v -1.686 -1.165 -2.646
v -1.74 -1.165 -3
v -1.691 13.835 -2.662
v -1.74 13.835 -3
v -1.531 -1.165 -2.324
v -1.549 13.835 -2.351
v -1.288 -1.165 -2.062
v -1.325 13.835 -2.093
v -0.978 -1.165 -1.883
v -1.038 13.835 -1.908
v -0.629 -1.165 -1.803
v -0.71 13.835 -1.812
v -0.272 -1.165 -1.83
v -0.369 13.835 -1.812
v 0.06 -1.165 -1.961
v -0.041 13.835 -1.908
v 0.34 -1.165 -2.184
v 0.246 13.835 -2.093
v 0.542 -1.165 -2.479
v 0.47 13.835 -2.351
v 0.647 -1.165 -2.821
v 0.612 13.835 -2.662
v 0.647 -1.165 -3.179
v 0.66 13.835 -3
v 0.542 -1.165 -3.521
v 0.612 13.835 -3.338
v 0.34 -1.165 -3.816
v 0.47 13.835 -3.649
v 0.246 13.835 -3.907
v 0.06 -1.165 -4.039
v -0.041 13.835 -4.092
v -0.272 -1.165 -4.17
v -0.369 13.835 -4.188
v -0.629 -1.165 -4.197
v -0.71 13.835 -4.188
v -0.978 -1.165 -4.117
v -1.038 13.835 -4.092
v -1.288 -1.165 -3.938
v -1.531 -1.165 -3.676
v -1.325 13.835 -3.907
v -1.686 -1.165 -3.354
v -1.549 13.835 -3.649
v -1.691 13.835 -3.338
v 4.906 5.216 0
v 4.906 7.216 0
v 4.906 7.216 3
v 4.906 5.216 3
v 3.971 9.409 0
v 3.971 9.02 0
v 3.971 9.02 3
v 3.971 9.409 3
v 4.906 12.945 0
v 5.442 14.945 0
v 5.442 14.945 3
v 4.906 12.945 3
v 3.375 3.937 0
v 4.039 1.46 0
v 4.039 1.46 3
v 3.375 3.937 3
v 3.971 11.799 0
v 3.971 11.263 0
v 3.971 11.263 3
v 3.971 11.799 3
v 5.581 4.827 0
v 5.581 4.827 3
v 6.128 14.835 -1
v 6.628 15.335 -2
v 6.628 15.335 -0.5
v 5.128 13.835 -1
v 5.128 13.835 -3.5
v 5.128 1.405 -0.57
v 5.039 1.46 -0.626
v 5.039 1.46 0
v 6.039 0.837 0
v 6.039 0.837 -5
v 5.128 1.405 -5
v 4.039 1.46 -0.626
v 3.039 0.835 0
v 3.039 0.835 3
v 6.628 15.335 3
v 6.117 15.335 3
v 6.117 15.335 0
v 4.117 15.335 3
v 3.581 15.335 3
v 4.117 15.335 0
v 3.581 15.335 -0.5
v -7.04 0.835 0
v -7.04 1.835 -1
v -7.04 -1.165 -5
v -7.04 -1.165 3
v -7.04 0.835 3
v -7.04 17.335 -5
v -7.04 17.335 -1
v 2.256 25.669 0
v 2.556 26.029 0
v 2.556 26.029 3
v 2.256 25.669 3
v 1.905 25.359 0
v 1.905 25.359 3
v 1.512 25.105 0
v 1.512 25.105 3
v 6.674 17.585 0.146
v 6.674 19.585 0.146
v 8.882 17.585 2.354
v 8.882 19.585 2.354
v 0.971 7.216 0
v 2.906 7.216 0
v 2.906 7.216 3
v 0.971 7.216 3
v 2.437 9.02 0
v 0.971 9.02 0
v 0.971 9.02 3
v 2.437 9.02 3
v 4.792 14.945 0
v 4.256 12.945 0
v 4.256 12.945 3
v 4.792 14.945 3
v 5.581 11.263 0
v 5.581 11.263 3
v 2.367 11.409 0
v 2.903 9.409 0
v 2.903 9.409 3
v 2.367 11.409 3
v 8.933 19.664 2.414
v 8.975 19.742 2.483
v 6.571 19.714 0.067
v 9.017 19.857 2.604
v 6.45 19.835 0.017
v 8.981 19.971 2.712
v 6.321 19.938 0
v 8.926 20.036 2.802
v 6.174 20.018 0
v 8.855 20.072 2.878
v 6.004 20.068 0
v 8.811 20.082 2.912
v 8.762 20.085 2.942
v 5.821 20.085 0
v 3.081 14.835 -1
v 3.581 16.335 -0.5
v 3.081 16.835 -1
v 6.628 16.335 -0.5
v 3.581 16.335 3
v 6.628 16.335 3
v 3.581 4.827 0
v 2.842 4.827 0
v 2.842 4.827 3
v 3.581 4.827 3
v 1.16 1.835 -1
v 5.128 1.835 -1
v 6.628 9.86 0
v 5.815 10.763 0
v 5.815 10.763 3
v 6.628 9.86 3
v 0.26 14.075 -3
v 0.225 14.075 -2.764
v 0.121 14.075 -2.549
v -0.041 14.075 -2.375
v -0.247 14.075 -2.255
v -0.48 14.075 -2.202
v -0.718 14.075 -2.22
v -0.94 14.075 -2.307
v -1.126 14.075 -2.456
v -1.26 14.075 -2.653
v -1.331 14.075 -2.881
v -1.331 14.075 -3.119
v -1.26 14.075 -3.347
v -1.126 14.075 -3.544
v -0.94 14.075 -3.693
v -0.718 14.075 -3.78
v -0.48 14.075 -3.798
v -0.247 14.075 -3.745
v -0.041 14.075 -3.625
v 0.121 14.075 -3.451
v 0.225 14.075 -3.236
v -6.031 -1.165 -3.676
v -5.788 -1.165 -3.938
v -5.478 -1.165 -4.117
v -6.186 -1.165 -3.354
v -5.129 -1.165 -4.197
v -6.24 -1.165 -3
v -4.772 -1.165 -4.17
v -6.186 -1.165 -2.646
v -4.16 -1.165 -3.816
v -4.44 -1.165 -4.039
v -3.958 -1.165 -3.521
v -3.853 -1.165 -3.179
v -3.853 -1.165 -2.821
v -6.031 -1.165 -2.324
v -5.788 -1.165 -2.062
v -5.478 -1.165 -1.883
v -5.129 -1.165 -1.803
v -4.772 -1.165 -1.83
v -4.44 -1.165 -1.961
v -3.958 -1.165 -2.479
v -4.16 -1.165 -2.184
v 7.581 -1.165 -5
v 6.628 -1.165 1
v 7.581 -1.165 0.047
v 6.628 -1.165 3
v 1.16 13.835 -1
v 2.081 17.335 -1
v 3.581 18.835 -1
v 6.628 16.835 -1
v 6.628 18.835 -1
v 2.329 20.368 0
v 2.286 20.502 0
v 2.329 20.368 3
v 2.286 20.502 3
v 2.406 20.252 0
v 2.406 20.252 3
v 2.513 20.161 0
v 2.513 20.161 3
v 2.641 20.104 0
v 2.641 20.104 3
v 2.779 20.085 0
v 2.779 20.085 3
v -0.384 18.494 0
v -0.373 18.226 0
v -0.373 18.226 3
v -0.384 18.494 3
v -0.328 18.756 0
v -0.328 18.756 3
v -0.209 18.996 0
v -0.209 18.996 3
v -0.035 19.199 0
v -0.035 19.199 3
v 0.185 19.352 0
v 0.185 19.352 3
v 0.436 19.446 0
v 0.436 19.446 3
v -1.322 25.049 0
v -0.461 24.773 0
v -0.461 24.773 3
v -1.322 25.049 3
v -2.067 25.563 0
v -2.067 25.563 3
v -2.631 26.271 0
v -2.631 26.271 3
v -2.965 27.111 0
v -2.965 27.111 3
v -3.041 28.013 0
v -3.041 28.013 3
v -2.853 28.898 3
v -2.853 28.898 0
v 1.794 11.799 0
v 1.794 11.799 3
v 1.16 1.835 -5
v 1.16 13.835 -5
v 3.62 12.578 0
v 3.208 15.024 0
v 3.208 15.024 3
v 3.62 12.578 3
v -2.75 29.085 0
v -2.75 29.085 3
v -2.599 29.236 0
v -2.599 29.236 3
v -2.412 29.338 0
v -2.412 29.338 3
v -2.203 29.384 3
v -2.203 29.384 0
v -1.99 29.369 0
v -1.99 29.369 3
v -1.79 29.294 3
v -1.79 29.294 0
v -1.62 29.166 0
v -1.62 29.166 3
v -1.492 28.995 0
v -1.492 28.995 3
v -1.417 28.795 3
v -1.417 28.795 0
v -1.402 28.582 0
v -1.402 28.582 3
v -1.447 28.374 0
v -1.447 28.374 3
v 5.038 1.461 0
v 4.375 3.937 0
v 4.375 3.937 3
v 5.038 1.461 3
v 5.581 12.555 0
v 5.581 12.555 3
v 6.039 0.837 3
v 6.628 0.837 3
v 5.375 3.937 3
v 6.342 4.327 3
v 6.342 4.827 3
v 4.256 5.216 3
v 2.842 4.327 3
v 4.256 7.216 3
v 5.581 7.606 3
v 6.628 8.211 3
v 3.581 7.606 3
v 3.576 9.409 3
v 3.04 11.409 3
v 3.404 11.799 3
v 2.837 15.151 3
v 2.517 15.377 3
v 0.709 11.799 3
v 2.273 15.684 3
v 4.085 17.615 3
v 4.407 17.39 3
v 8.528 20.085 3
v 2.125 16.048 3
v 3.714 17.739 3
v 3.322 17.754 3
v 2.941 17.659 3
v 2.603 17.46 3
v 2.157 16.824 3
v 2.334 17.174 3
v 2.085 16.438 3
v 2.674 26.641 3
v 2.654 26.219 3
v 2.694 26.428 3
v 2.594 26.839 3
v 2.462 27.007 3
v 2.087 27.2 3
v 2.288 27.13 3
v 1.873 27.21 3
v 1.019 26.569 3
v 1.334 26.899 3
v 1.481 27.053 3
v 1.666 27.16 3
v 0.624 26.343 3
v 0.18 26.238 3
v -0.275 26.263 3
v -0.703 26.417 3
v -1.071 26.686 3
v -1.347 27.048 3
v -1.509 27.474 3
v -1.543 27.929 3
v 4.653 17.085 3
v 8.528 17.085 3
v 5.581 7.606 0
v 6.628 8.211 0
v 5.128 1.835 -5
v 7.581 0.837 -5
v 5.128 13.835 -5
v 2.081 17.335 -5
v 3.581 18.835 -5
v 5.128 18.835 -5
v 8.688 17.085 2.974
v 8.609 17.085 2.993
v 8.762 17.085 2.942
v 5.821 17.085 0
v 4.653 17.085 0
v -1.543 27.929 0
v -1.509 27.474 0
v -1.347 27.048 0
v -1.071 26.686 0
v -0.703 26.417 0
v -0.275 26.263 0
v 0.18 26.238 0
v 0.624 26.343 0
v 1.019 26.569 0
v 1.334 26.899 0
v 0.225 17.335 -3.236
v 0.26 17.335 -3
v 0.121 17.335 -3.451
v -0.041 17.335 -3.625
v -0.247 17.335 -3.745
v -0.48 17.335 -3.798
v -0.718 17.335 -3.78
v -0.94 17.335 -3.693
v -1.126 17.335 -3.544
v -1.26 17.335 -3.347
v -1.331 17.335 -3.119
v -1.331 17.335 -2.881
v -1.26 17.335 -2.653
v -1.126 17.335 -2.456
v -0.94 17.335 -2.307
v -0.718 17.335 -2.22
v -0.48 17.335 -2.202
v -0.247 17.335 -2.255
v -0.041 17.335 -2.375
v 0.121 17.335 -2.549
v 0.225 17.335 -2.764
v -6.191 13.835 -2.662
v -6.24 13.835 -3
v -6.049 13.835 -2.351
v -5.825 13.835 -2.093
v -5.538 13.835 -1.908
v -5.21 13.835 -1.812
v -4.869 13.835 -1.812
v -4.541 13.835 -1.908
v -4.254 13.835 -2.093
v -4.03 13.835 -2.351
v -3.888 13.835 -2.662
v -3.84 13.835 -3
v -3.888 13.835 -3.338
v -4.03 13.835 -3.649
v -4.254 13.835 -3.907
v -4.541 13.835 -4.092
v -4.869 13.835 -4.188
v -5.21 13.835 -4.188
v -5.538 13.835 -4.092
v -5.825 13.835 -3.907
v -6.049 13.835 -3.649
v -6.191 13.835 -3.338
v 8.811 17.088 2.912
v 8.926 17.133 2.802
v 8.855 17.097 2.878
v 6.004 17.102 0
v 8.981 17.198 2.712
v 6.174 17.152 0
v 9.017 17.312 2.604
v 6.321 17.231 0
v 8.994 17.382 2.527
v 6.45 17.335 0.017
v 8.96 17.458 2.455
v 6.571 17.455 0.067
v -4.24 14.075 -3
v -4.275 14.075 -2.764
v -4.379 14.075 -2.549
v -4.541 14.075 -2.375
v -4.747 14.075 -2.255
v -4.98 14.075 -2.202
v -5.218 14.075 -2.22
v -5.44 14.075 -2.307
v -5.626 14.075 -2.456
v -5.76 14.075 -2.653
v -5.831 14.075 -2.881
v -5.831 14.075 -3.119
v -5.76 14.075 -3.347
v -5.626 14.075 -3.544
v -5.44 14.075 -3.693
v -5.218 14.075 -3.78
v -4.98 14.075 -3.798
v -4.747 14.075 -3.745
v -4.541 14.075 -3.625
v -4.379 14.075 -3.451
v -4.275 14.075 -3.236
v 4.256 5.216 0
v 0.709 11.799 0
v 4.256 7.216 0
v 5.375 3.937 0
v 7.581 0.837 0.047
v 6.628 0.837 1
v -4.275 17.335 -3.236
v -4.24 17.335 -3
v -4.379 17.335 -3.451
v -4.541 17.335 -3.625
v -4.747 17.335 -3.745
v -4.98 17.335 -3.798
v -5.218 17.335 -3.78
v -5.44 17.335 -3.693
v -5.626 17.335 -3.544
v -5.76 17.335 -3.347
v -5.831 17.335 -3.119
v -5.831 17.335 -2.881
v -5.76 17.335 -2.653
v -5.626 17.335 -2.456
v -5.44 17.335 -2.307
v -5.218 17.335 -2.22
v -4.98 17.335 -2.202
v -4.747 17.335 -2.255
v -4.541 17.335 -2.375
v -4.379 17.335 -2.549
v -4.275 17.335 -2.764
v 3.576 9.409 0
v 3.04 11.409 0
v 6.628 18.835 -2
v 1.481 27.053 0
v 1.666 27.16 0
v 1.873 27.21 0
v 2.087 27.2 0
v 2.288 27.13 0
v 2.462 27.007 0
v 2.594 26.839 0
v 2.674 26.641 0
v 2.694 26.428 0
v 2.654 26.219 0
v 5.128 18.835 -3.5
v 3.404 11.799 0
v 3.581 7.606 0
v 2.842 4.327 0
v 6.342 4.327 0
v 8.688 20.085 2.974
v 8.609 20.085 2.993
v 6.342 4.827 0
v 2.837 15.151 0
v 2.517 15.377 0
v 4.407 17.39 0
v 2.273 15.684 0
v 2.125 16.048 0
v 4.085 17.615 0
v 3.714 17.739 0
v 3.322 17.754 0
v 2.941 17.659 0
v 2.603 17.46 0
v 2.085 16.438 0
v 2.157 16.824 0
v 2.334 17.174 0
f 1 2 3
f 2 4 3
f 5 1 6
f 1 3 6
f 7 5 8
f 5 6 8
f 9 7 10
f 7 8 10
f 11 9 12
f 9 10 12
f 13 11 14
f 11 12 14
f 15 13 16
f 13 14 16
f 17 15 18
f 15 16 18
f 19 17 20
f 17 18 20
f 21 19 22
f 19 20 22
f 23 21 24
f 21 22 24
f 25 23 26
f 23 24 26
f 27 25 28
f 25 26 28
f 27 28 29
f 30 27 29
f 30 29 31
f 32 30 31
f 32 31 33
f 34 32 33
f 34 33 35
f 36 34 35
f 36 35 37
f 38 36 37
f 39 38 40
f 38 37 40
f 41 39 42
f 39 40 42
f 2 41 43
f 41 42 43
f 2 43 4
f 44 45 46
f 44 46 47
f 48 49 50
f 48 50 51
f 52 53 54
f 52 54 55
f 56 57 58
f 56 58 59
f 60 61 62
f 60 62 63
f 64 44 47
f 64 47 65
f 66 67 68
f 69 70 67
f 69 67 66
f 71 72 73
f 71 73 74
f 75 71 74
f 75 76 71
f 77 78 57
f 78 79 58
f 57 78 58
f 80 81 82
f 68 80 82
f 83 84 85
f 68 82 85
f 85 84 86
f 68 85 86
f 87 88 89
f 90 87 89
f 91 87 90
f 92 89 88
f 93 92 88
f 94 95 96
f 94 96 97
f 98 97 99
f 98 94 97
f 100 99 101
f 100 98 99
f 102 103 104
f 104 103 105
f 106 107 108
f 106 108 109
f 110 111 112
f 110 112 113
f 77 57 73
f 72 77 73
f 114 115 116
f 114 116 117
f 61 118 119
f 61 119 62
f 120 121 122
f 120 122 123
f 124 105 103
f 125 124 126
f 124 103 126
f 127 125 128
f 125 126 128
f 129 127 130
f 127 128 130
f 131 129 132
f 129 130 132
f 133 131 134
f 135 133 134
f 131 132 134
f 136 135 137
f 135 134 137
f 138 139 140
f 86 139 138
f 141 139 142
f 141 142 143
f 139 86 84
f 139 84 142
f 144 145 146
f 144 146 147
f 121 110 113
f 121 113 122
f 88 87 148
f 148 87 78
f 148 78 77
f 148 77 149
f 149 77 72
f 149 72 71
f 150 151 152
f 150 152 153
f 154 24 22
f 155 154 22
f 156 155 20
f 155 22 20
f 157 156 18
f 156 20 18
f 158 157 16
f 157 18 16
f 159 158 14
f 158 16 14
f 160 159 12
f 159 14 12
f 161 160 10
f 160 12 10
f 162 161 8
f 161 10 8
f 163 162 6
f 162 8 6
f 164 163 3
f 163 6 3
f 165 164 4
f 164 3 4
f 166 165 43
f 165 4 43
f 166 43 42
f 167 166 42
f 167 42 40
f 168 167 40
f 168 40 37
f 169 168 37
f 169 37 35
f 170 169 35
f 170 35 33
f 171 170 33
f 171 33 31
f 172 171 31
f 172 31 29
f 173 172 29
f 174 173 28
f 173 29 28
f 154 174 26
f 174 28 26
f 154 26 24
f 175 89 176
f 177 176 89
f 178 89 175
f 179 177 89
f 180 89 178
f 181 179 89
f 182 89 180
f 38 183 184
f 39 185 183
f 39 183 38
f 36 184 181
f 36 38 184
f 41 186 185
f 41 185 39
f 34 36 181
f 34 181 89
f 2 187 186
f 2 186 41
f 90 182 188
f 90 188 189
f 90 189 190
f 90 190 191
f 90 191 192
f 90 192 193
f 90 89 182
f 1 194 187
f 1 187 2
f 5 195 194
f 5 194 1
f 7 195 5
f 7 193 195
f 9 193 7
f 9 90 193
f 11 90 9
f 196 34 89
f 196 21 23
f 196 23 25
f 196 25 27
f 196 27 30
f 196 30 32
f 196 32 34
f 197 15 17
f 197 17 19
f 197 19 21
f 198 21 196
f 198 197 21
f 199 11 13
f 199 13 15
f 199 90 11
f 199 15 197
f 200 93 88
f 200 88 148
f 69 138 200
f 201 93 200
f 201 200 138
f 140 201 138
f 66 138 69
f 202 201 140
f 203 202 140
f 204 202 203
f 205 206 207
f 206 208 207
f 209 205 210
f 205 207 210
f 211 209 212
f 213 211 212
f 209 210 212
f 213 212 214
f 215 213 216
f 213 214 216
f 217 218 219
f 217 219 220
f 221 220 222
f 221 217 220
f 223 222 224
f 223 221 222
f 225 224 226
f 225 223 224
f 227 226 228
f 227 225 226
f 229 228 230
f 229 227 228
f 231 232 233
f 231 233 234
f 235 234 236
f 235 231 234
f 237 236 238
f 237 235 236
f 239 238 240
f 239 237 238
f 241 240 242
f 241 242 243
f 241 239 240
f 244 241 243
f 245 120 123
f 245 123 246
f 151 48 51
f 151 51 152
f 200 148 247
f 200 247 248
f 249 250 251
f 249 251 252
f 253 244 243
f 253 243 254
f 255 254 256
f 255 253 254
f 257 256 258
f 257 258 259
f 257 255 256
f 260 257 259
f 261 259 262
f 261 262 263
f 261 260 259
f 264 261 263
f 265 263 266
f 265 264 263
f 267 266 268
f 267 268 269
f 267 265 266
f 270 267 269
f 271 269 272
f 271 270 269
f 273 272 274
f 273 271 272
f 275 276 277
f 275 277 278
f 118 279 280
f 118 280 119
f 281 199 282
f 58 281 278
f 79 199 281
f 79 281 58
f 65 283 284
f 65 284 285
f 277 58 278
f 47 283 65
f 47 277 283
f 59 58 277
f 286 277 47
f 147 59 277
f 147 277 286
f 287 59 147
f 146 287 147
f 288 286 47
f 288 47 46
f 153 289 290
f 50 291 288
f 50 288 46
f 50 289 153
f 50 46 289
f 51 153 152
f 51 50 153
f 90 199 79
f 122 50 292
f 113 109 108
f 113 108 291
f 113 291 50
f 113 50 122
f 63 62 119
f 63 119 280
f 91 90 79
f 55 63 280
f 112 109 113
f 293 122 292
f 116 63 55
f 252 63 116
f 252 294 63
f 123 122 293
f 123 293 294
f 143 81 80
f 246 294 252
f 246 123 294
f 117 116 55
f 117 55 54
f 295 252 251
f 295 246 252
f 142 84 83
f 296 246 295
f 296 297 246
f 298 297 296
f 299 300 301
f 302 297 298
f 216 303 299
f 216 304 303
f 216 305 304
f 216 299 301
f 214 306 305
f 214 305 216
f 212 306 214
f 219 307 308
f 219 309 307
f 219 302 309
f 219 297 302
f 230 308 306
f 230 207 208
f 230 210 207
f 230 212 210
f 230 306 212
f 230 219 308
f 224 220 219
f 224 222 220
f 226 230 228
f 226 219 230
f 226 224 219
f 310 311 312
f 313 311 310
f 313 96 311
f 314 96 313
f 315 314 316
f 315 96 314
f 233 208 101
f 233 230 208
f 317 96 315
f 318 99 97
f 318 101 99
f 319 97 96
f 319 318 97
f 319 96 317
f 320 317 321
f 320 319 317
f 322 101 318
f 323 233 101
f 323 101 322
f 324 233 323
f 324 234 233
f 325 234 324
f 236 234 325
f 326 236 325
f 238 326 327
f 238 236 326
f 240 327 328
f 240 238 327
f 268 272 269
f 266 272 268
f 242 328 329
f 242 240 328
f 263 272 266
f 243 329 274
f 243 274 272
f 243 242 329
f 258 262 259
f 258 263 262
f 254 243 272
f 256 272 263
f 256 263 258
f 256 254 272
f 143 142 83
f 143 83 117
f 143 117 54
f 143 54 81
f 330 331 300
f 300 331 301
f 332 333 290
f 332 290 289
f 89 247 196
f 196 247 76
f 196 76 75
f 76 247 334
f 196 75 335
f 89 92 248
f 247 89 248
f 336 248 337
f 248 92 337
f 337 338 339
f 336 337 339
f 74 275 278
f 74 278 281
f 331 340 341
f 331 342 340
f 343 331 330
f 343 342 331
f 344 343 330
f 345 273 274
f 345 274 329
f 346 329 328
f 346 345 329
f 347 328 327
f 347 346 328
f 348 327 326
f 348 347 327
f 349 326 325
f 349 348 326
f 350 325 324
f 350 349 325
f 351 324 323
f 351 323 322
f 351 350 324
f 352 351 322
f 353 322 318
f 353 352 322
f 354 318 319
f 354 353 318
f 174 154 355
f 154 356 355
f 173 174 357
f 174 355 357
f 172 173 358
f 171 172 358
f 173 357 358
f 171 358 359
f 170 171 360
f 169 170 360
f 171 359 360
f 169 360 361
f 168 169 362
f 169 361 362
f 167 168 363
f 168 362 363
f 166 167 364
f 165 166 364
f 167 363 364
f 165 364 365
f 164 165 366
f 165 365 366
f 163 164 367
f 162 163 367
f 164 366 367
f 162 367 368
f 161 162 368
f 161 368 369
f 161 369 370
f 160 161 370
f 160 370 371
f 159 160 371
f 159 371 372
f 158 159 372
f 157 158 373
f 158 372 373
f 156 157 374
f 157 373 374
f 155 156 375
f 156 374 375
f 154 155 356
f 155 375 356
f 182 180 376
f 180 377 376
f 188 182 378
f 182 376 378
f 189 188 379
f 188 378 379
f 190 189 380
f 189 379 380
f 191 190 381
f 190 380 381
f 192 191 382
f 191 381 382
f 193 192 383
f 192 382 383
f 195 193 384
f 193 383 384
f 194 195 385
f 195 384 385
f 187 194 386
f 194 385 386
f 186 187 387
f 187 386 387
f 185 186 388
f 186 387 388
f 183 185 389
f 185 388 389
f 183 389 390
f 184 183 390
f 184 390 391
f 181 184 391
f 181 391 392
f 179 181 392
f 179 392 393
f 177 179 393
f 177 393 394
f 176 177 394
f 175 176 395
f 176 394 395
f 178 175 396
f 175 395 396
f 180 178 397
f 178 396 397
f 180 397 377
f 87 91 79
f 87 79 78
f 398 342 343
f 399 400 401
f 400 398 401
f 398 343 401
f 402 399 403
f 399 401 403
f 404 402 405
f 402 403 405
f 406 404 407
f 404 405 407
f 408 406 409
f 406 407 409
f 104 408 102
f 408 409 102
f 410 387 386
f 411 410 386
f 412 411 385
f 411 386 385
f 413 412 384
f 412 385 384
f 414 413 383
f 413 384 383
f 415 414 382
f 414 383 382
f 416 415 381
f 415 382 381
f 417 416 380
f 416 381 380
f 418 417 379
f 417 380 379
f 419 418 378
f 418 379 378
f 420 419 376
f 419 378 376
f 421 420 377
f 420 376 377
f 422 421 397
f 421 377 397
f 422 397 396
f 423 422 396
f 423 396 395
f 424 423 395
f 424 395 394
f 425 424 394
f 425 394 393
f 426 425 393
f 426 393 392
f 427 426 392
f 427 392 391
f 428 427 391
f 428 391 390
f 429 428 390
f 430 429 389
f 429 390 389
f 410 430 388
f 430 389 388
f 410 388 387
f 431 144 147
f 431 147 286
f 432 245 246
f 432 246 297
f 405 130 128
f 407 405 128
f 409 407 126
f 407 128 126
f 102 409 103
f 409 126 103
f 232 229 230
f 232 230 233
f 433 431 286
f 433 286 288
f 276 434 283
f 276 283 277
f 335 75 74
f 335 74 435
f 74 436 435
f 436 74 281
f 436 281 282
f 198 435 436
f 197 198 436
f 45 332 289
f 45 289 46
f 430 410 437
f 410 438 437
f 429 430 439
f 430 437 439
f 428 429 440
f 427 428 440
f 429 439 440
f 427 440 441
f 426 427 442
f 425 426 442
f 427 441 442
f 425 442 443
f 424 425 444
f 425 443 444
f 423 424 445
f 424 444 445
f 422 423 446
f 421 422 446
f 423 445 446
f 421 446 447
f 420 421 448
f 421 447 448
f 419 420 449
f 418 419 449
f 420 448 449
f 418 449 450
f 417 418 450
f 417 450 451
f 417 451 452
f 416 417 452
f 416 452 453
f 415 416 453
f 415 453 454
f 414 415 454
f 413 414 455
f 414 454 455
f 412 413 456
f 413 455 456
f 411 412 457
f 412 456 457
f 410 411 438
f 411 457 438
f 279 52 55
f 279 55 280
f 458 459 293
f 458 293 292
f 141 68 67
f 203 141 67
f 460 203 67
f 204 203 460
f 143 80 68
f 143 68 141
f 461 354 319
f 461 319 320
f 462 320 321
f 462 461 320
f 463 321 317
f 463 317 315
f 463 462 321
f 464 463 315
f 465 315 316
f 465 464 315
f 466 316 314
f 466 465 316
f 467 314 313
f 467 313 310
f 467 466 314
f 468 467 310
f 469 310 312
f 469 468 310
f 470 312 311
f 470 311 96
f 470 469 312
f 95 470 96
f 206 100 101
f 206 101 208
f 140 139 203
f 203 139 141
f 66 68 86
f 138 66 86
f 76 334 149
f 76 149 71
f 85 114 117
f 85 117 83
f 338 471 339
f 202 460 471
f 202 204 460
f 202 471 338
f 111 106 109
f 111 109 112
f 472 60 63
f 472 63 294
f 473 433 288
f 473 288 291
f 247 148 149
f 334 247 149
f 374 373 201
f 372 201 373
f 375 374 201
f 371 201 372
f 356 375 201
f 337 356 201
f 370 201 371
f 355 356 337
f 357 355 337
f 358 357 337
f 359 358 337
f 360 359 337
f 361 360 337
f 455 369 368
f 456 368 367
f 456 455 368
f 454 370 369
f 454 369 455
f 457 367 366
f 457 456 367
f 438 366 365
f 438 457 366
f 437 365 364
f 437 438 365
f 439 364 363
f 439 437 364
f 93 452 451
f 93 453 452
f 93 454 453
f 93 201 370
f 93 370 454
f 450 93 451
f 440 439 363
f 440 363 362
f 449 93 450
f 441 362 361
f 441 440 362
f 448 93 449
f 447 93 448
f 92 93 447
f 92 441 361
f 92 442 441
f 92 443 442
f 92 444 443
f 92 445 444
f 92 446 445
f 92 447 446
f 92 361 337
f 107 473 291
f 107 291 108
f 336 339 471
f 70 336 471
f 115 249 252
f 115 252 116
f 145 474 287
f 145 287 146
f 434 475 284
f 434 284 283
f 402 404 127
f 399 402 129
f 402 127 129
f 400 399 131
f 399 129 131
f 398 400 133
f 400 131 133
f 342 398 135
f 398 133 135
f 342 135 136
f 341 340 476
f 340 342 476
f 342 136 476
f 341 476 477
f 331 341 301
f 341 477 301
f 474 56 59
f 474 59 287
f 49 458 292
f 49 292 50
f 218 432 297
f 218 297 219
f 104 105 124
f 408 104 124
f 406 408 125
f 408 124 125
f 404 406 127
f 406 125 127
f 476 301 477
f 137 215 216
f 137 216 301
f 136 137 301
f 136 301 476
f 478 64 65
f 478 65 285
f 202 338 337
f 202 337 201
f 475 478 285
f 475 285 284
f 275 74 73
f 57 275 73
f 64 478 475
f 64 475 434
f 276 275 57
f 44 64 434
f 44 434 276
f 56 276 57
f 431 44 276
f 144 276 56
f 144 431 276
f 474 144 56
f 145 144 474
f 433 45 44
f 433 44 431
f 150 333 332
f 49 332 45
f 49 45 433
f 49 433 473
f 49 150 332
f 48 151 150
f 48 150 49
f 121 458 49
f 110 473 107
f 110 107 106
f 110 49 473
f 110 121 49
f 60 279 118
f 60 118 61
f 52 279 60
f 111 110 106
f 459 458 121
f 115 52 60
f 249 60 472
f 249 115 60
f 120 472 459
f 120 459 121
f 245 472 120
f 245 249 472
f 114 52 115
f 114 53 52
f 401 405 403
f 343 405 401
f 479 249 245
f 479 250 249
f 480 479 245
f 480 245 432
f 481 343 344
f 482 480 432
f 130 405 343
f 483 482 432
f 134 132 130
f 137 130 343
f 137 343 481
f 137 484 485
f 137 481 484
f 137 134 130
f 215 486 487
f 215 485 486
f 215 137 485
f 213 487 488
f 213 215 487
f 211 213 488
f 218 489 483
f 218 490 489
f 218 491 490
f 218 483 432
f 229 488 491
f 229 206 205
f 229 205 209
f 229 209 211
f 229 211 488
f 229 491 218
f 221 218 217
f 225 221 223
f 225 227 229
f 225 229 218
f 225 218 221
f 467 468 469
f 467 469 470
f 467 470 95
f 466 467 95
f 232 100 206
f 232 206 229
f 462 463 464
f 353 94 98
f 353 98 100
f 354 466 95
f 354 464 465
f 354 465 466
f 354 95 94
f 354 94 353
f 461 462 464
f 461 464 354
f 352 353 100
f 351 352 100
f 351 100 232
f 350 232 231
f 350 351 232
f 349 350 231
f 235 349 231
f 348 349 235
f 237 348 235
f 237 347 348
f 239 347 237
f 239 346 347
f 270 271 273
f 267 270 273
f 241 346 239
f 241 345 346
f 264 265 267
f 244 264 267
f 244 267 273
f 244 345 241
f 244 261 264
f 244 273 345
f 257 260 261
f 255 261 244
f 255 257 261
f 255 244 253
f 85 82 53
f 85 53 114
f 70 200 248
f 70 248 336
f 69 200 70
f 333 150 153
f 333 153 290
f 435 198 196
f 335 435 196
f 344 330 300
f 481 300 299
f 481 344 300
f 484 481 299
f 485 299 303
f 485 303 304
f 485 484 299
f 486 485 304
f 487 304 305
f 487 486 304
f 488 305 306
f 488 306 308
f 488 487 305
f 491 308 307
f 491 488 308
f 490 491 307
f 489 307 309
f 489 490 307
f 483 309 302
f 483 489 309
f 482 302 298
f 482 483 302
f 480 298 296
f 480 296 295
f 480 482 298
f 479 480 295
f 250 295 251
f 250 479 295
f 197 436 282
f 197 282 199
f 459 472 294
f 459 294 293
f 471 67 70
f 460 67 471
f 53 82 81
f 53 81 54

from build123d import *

# Parameters (mm, degrees)
BOSS_SWITCH_BODY_DEPTH                    = 3
SKETCH1_W                                 = 4
SKETCH1_H                                 = 3.5
BOSS_FLANGE_WIDTH_DEPTH                   = 5
BOSS_FLANGE_HEIGHT_REACH                  = 35.863
SKETCH2_W                                 = 4
SKETCH2_H                                 = 2
SKETCH2_W_2                               = 8
SKETCH24_W                                = 4
SKETCH24_H                                = 2.5
CUT_WALL_CLEARANCE_DEPTH                  = 1
CUT_UP_TO_DOWN_DERAILLEUR_CLEARANCE_REACH = 21.462
SKETCH10_W                                = 2.453096586
SKETCH10_H                                = 3
SKETCH17_W                                = 12.1675
SKETCH17_H                                = 4
BOSS_FLANGE_SUPPORT_DEPTH                 = 14.5
TAP_DRILL_FOR_M2X0_4_TAP1_D               = 1.6
M2_CLEARANCE_HOLE2_D                      = 2.4
M2_CLEARANCE_HOLE2_DEPTH                  = 15
M2_CLEARANCE_HOLE2_TIP                    = 0.721032743
CUT_UP_TO_DOWN_CANTILEVER_SLOPE_REACH     = 25.623
CHAMFER_FLANGE_SUPPORT_SIZE               = 1.5
CHAMFER_FLANGE_SUPPORT_2_SIZE             = 1.5
CHAMFER_FLANGE_SUPPORT_3_SIZE             = 1
CHAMFER3_SIZE                             = 0.5
SKETCH23_W                                = 3.9675
SKETCH23_H                                = 12
CUT_GAP_FOR_PRINTING_DEPTH                = 32.000499688
SKETCH25_W                                = 0.953096586
SKETCH25_H                                = 3.5
CUT_DERAILLEUR_CLEARANCE_DEPTH            = 32.145320369
CHAMFER8_SIZE                             = 1
FILLET1_R                                 = 0.5
FILLET2_R                                 = 0.5


# Some blends are built 0.0001 mm under size
with BuildPart() as part:
    # Sketch-SwitchBossUp → Boss-Switch Body (new body)
    with BuildSketch(Plane.XY):
        with BuildLine():
            Line((5.581091201, 12.555245643), (5.581100766, 11.263014573))
            Line((5.581100766, 11.263014573), (3.971265023, 11.263014573))
            Line((3.971265023, 11.263014573), (3.97126394, 11.799102818))
            Line((3.97126394, 11.799102818), (3.403924927, 11.799102818))
            Line((3.403924927, 11.799102818), (3.039779642, 11.409400656))
            Line((3.039779642, 11.409400656), (3.575693893, 9.409400656))
            Line((3.575693893, 9.409400656), (3.971278743, 9.019679955))
            Line((3.971278743, 9.019679955), (3.971278743, 9.409400656))
            Line((3.971278743, 9.409400656), (5.815190872, 10.763014573))
            Line((5.815190872, 10.763014573), (6.627976927, 9.860324208))
            Line((6.627976927, 9.860324208), (6.627976927, 8.210536506))
            Line((6.627976927, 8.210536506), (5.581127833, 7.606137899))
            Line((5.581127833, 7.606137899), (4.906138119, 7.216432406))
            Line((4.906138119, 7.216432406), (4.906138119, 5.216432406))
            Line((4.906138119, 5.216432406), (5.58114552, 4.826716701))
            Line((5.58114552, 4.826716701), (6.342350466, 4.826716701))
            Line((6.342350466, 4.826716701), (6.342350466, 4.326716701))
            Line((6.342350466, 4.326716701), (5.374946804, 3.937018274))
            Line((5.374946804, 3.937018274), (4.374946804, 3.937018274))
            Line((4.374946804, 3.937018274), (5.038286759, 1.461399857))
            Line((5.038286759, 1.461399857), (6.03883266, 0.837018274))
            Line((6.03883266, 0.837018274), (6.627976927, 0.837018274))
            Line((6.627976927, 0.837018274), (6.627976927, -1.165310653))
            Line((6.627976927, -1.165310653), (5.038286759, -1.165310653))
            Line((5.038286759, -1.165310653), (3.03883266, -1.165310653))
            Line((3.03883266, -1.165310653), (3.03883266, 0.834689347))
            Line((3.03883266, 0.834689347), (4.03855971, 1.460381193))
            Line((4.03855971, 1.460381193), (3.374946804, 3.937018274))
            Line((3.374946804, 3.937018274), (2.842350466, 4.326720436))
            Line((2.842350466, 4.326720436), (2.842350466, 4.826720436))
            Line((2.842350466, 4.826720436), (3.58114552, 4.826720436))
            Line((3.58114552, 4.826720436), (4.256138119, 5.216427595))
            Line((4.256138119, 5.216427595), (4.256138119, 7.216427595))
            Line((4.256138119, 7.216427595), (3.581130717, 7.6061433))
            Line((3.581130717, 7.6061433), (2.9061262, 7.216422599))
            Line((2.9061262, 7.216422599), (0.971281627, 7.216422599))
            Line((0.971281627, 7.216422599), (0.971281627, 9.019700159))
            Line((0.971281627, 9.019700159), (1.971281627, 9.019700159))
            Line((1.971281627, 9.019700159), (2.437470124, 9.019700159))
            Line((2.437470124, 9.019700159), (2.902763041, 9.409400656))
            Line((2.902763041, 9.409400656), (2.36684879, 11.409400656))
            Line((2.36684879, 11.409400656), (1.794010401, 11.799102818))
            Line((1.794010401, 11.799102818), (0.709180957, 11.799102818))
            Line((0.709180957, 11.799102818), (-0.372790983, 18.226392362))
            ThreePointArc((-0.372790983, 18.226392362), (-0.209317989, 18.996086179), (0.435897335, 19.446473985))
            Line((0.435897335, 19.446473985), (-0.46073685, 24.772792819))
            ThreePointArc((-0.46073685, 24.772792819), (-2.630501593, 26.270619745), (-2.852546321, 28.897797067))
            ThreePointArc((-2.852546321, 28.897797067), (-1.887813913, 29.338582026), (-1.447028953, 28.373849618))
            ThreePointArc((-1.447028953, 28.373849618), (-0.703448682, 26.416936722), (1.333779254, 26.898727173))
            ThreePointArc((1.333779254, 26.898727173), (2.379722745, 27.074801628), (2.555797201, 26.028858137))
            ThreePointArc((2.555797201, 26.028858137), (2.086504637, 25.507104397), (1.511513111, 25.104801997))
            Line((1.511513111, 25.104801997), (2.35660045, 20.084689347))
            Line((2.35660045, 20.084689347), (7.435924807, 20.084689347))
            Line((7.435924807, 20.084689347), (9.027976927, 20.084689347))
            Line((9.027976927, 20.084689347), (9.027976927, 17.084689347))
            Line((9.027976927, 17.084689347), (4.653192692, 17.084689347))
            ThreePointArc((4.653192692, 17.084689347), (2.334416318, 17.173683719), (3.208498298, 15.02411991))
            Line((3.208498298, 15.02411991), (3.620297651, 12.577888564))
            Line((3.620297651, 12.577888564), (4.256080915, 12.944958203))
            Line((4.256080915, 12.944958203), (4.791964496, 14.944962169))
            Line((4.791964496, 14.944962169), (4.116925685, 15.334689347))
            Line((4.116925685, 15.334689347), (3.581073513, 15.334689347))
            Line((3.581073513, 15.334689347), (3.581073513, 16.334689347))
            Line((3.581073513, 16.334689347), (5.725580434, 16.334689347))
            Line((5.725580434, 16.334689347), (6.627976927, 16.334689347))
            Line((6.627976927, 16.334689347), (6.627976927, 15.334689347))
            Line((6.627976927, 15.334689347), (6.116971898, 15.334689347))
            Line((6.116971898, 15.334689347), (5.441964496, 14.94496698))
            Line((5.441964496, 14.94496698), (4.906080915, 12.944963014))
            Line((4.906080915, 12.944963014), (5.581091201, 12.555245643))
        make_face()
    extrude(amount=BOSS_SWITCH_BODY_DEPTH)

    # Sketch1 → Boss-Flange Width (add)
    with BuildSketch(Plane(origin=(0, 0, 0), x_dir=(-1, 0, 0), z_dir=(0, 0, -1))):
        Polygon((-7.581073513, -1.165310653), (0.412170615, -1.165310653), (0.412170615, 0.834689347), (-3.03883266, 0.834689347), (-4.03855971, 1.460381193), (-5.03855971, 1.460381193), (-6.03883266, 0.837018274), (-7.581073513, 0.837018274), align=None)
        with Locations((-5.581073513, 17.084689347)):
            Rectangle(SKETCH1_W, SKETCH1_H)
    extrude(amount=BOSS_FLANGE_WIDTH_DEPTH)

    # Sketch2 → Boss-Flange Height (add, up to next)
    with BuildSketch(Plane(origin=(-7.039523073, 0, 0), x_dir=(0, 0, -1), z_dir=(1, 0, 0)), mode=Mode.PRIVATE) as boss_flange_height_sk1:
        with Locations((3, 16.334689347)):
            Rectangle(SKETCH2_W, SKETCH2_H)
    boss_flange_height_tool1 = extrude(boss_flange_height_sk1.sketch, amount=BOSS_FLANGE_HEIGHT_REACH, mode=Mode.PRIVATE) - part.part
    # Sketch2 → Boss-Flange Height (add, up to next)
    with BuildSketch(Plane(origin=(-7.039523073, 0, 0), x_dir=(0, 0, -1), z_dir=(1, 0, 0)), mode=Mode.PRIVATE) as boss_flange_height_sk2:
        with Locations((1, -0.165310653)):
            Rectangle(SKETCH2_W_2, SKETCH2_H)
    boss_flange_height_tool2 = extrude(boss_flange_height_sk2.sketch, amount=BOSS_FLANGE_HEIGHT_REACH, mode=Mode.PRIVATE) - part.part
    add(boss_flange_height_tool1.solids().sort_by_distance((-7.039523, 16.334689, -3))[0])
    add(boss_flange_height_tool2.solids().sort_by_distance((-7.039523, -0.165311, -1))[0])

    # Sketch24 → Cut-Wall Clearance (cut)
    with BuildSketch(Plane.XY):
        with Locations((5.581073513, 17.584689347)):
            Rectangle(SKETCH24_W, SKETCH24_H)
    extrude(amount=-CUT_WALL_CLEARANCE_DEPTH, mode=Mode.SUBTRACT)

    # Sketch10 → Cut-Up-To-Down Derailleur Clearance (cut, up to next)
    with BuildSketch(Plane(origin=(0, 15.334689347, 0), x_dir=(1, 0, 0), z_dir=(0, 1, 0)), mode=Mode.PRIVATE) as cut_up_to_down_derailleur_clearance_sk1:
        with Locations((6.35452522, 3.5)):
            Rectangle(SKETCH10_W, SKETCH10_H)
    cut_up_to_down_derailleur_clearance_tool1 = extrude(cut_up_to_down_derailleur_clearance_sk1.sketch, amount=CUT_UP_TO_DOWN_DERAILLEUR_CLEARANCE_REACH, mode=Mode.PRIVATE) & part.part
    add(cut_up_to_down_derailleur_clearance_tool1.solids().sort_by_distance((6.354525, 15.334689, -3.5))[0], mode=Mode.SUBTRACT)

    # Sketch17 → Boss-Flange Support (add)
    with BuildSketch(Plane.XZ.offset(-15.334689347)):
        with Locations((-0.955773073, -3)):
            Rectangle(SKETCH17_W, SKETCH17_H)
    extrude(amount=BOSS_FLANGE_SUPPORT_DEPTH)

    # Tap Drill for M2x0.4 Tap1 (through all)
    with Locations(Plane(origin=(0, -1.165310653, 0), x_dir=(-1, 0, 0), z_dir=(0, -1, 0))):
        with Locations((5.039523073, 3), (0.539523073, 3)):
            Hole(TAP_DRILL_FOR_M2X0_4_TAP1_D / 2)

    # M2 Clearance Hole2
    with Locations(Plane.XZ.offset(1.165310653)):
        with Locations((-5.039523073, -3), (-0.539523073, -3)):
            Hole(M2_CLEARANCE_HOLE2_D / 2, depth=M2_CLEARANCE_HOLE2_DEPTH)
            with Locations((0, 0, -(M2_CLEARANCE_HOLE2_DEPTH + M2_CLEARANCE_HOLE2_TIP / 2))):  # 118° drill point
                Cone(0, M2_CLEARANCE_HOLE2_D / 2, M2_CLEARANCE_HOLE2_TIP, mode=Mode.SUBTRACT)

    # Sketch12 → Cut-Up-to-Down Cantilever Slope (cut, up to next)
    with BuildSketch(Plane(origin=(0, 20.084689347, 0), x_dir=(1, 0, 0), z_dir=(0, 1, 0)), mode=Mode.PRIVATE) as cut_up_to_down_cantilever_slope_sk1:
        Polygon((6.527976927, 0), (9.027976927, -2.5), (9.027976927, 0), align=None)
    cut_up_to_down_cantilever_slope_tool1 = extrude(cut_up_to_down_cantilever_slope_sk1.sketch, amount=-CUT_UP_TO_DOWN_CANTILEVER_SLOPE_REACH, mode=Mode.PRIVATE) & part.part
    add(cut_up_to_down_cantilever_slope_tool1.solids().sort_by_distance((8.194644, 20.084689, 0.833333))[0], mode=Mode.SUBTRACT)

    # Chamfer-Flange Support
    chamfer_flange_support_edges = [part.edges().sort_by_distance(p)[0] for p in [
        (3.581073513, 17.334689347, -3),
    ]]
    chamfer(chamfer_flange_support_edges, length=CHAMFER_FLANGE_SUPPORT_SIZE - 0.0001)  # a hair under: the kernel refuses the full size

    # Chamfer-Flange Support 2
    chamfer_flange_support_2_edges = [part.edges().sort_by_distance(p)[0] for p in [
        (5.127976927, 17.084689347, -2),
        (5.127976927, 15.334689347, -1.5),
    ]]
    chamfer(chamfer_flange_support_2_edges, length=CHAMFER_FLANGE_SUPPORT_2_SIZE)

    # Chamfer-Flange Support 3
    chamfer_flange_support_3_edges = [part.edges().sort_by_distance(p)[0] for p in [
        (-2.000345206, 0.834689347, -1),
    ]]
    chamfer(chamfer_flange_support_3_edges, length=CHAMFER_FLANGE_SUPPORT_3_SIZE)

    # Chamfer3
    chamfer3_edges = [part.edges().sort_by_distance(p)[0] for p in [
        (3.581073513, 15.834689347, -1),
        (5.581073513, 16.334689347, -1),
        (5.10452522, 15.334689347, -1),
    ]]
    chamfer(chamfer3_edges, length=CHAMFER3_SIZE)

    # Sketch23 → Cut-Gap for Printing (cut, through all)
    with BuildSketch(Plane.XY.offset(-1)):
        with Locations((3.144226927, 7.834689347)):
            Rectangle(SKETCH23_W, SKETCH23_H)
    extrude(amount=-CUT_GAP_FOR_PRINTING_DEPTH, mode=Mode.SUBTRACT)

    # Sketch25 → Cut-Derailleur Clearance (cut, through all)
    with BuildSketch(Plane.XY):
        with Locations((7.10452522, 17.084689347)):
            Rectangle(SKETCH25_W, SKETCH25_H)
    extrude(amount=-CUT_DERAILLEUR_CLEARANCE_DEPTH, mode=Mode.SUBTRACT)

    # Chamfer8
    # the kernel refuses this chamfer: 1 mm, written as the material it adds along each edge
    with BuildSketch(Plane(origin=(6.627976927, 0.837018274, 0), x_dir=(0.9996219169112968, 0, -0.027495876610586365), z_dir=(0, -1, 0))) as chamfer8_piece_1_section:
        Polygon((CHAMFER8_SIZE * 0.999621916911, CHAMFER8_SIZE * 0.0274958766106), (-CHAMFER8_SIZE * 0.0274958766106, CHAMFER8_SIZE * 0.999621916911), (0, 0), align=None)
    chamfer8_piece_1 = extrude(amount=2.002328927, mode=Mode.PRIVATE)
    chamfer8_piece_1 = split(chamfer8_piece_1, bisect_by=Plane(origin=(7.581073513, -0.16414619, 0.332375145), z_dir=(-1, 0, 0)), keep=Keep.TOP, mode=Mode.PRIVATE)
    add(chamfer8_piece_1)

    # Fillet1
    # the kernel refuses this fillet: 0.5 mm, written as the material it takes off along each edge
    with BuildSketch(Plane(origin=(6.527976927, 20.6024563, 0), x_dir=(-1, 0, 0), z_dir=(0, -1, 0))) as fillet1_piece_1:
        with BuildLine():
            CenterArc((FILLET1_R * 0.414213562373, -FILLET1_R), FILLET1_R, 90, 45)
            Line((-FILLET1_R * 0.292893218813, -FILLET1_R * 0.292893218813), (0, 0))
            Line((0, 0), (FILLET1_R * 0.414213562373, 0))
        make_face()
    extrude(amount=4.035533906, mode=Mode.SUBTRACT)
    with BuildSketch(Plane(origin=(9.027976927, 21.334689347, 3), x_dir=(0, 0, -1), z_dir=(0, -1, 0))) as fillet1_piece_2:
        with BuildLine():
            CenterArc((FILLET1_R, -FILLET1_R), FILLET1_R, 90, 90)
            Line((0, -FILLET1_R), (0, 0))
            Line((0, 0), (FILLET1_R, 0))
        make_face()
    extrude(amount=5.5, mode=Mode.SUBTRACT)
    with BuildSketch(Plane(origin=(5.644093451, 20.084689347, -0.883883476), x_dir=(-0.7071067811865437, 0, 0.7071067811865512), z_dir=(0.7071067811865513, 0, 0.7071067811865437)), Plane(origin=(5.644093451, 17.084689347, -0.883883476), x_dir=(0, 1, 0), z_dir=(0.7071067811865513, 0, 0.7071067811865437))) as fillet1_piece_3:
        with BuildLine():
            CenterArc((FILLET1_R, FILLET1_R), FILLET1_R, 180, 90)
            Line((0, FILLET1_R), (0, 0))
            Line((0, 0), (FILLET1_R, 0))
        make_face()
    extrude(amount=6.035533906, mode=Mode.SUBTRACT)
    with BuildSketch(Plane(origin=(9.027976927, 20.6024563, 2.5), x_dir=(0, 0, 1), z_dir=(0, -1, 0))) as fillet1_piece_4:
        with BuildLine():
            CenterArc((FILLET1_R * 0.414213562373, FILLET1_R), FILLET1_R, 225, 45)
            Line((-FILLET1_R * 0.292893218813, FILLET1_R * 0.292893218813), (0, 0))
            Line((0, 0), (FILLET1_R * 0.414213562373, 0))
        make_face()
    extrude(amount=4.035533906, mode=Mode.SUBTRACT)

    # Fillet2
    fillet2_edges = [part.edges().sort_by_distance(p)[0] for p in [
        (2.35660045, 20.084689347, 1.5),
    ]]
    fillet(fillet2_edges, radius=FILLET2_R)


solid = part.part
